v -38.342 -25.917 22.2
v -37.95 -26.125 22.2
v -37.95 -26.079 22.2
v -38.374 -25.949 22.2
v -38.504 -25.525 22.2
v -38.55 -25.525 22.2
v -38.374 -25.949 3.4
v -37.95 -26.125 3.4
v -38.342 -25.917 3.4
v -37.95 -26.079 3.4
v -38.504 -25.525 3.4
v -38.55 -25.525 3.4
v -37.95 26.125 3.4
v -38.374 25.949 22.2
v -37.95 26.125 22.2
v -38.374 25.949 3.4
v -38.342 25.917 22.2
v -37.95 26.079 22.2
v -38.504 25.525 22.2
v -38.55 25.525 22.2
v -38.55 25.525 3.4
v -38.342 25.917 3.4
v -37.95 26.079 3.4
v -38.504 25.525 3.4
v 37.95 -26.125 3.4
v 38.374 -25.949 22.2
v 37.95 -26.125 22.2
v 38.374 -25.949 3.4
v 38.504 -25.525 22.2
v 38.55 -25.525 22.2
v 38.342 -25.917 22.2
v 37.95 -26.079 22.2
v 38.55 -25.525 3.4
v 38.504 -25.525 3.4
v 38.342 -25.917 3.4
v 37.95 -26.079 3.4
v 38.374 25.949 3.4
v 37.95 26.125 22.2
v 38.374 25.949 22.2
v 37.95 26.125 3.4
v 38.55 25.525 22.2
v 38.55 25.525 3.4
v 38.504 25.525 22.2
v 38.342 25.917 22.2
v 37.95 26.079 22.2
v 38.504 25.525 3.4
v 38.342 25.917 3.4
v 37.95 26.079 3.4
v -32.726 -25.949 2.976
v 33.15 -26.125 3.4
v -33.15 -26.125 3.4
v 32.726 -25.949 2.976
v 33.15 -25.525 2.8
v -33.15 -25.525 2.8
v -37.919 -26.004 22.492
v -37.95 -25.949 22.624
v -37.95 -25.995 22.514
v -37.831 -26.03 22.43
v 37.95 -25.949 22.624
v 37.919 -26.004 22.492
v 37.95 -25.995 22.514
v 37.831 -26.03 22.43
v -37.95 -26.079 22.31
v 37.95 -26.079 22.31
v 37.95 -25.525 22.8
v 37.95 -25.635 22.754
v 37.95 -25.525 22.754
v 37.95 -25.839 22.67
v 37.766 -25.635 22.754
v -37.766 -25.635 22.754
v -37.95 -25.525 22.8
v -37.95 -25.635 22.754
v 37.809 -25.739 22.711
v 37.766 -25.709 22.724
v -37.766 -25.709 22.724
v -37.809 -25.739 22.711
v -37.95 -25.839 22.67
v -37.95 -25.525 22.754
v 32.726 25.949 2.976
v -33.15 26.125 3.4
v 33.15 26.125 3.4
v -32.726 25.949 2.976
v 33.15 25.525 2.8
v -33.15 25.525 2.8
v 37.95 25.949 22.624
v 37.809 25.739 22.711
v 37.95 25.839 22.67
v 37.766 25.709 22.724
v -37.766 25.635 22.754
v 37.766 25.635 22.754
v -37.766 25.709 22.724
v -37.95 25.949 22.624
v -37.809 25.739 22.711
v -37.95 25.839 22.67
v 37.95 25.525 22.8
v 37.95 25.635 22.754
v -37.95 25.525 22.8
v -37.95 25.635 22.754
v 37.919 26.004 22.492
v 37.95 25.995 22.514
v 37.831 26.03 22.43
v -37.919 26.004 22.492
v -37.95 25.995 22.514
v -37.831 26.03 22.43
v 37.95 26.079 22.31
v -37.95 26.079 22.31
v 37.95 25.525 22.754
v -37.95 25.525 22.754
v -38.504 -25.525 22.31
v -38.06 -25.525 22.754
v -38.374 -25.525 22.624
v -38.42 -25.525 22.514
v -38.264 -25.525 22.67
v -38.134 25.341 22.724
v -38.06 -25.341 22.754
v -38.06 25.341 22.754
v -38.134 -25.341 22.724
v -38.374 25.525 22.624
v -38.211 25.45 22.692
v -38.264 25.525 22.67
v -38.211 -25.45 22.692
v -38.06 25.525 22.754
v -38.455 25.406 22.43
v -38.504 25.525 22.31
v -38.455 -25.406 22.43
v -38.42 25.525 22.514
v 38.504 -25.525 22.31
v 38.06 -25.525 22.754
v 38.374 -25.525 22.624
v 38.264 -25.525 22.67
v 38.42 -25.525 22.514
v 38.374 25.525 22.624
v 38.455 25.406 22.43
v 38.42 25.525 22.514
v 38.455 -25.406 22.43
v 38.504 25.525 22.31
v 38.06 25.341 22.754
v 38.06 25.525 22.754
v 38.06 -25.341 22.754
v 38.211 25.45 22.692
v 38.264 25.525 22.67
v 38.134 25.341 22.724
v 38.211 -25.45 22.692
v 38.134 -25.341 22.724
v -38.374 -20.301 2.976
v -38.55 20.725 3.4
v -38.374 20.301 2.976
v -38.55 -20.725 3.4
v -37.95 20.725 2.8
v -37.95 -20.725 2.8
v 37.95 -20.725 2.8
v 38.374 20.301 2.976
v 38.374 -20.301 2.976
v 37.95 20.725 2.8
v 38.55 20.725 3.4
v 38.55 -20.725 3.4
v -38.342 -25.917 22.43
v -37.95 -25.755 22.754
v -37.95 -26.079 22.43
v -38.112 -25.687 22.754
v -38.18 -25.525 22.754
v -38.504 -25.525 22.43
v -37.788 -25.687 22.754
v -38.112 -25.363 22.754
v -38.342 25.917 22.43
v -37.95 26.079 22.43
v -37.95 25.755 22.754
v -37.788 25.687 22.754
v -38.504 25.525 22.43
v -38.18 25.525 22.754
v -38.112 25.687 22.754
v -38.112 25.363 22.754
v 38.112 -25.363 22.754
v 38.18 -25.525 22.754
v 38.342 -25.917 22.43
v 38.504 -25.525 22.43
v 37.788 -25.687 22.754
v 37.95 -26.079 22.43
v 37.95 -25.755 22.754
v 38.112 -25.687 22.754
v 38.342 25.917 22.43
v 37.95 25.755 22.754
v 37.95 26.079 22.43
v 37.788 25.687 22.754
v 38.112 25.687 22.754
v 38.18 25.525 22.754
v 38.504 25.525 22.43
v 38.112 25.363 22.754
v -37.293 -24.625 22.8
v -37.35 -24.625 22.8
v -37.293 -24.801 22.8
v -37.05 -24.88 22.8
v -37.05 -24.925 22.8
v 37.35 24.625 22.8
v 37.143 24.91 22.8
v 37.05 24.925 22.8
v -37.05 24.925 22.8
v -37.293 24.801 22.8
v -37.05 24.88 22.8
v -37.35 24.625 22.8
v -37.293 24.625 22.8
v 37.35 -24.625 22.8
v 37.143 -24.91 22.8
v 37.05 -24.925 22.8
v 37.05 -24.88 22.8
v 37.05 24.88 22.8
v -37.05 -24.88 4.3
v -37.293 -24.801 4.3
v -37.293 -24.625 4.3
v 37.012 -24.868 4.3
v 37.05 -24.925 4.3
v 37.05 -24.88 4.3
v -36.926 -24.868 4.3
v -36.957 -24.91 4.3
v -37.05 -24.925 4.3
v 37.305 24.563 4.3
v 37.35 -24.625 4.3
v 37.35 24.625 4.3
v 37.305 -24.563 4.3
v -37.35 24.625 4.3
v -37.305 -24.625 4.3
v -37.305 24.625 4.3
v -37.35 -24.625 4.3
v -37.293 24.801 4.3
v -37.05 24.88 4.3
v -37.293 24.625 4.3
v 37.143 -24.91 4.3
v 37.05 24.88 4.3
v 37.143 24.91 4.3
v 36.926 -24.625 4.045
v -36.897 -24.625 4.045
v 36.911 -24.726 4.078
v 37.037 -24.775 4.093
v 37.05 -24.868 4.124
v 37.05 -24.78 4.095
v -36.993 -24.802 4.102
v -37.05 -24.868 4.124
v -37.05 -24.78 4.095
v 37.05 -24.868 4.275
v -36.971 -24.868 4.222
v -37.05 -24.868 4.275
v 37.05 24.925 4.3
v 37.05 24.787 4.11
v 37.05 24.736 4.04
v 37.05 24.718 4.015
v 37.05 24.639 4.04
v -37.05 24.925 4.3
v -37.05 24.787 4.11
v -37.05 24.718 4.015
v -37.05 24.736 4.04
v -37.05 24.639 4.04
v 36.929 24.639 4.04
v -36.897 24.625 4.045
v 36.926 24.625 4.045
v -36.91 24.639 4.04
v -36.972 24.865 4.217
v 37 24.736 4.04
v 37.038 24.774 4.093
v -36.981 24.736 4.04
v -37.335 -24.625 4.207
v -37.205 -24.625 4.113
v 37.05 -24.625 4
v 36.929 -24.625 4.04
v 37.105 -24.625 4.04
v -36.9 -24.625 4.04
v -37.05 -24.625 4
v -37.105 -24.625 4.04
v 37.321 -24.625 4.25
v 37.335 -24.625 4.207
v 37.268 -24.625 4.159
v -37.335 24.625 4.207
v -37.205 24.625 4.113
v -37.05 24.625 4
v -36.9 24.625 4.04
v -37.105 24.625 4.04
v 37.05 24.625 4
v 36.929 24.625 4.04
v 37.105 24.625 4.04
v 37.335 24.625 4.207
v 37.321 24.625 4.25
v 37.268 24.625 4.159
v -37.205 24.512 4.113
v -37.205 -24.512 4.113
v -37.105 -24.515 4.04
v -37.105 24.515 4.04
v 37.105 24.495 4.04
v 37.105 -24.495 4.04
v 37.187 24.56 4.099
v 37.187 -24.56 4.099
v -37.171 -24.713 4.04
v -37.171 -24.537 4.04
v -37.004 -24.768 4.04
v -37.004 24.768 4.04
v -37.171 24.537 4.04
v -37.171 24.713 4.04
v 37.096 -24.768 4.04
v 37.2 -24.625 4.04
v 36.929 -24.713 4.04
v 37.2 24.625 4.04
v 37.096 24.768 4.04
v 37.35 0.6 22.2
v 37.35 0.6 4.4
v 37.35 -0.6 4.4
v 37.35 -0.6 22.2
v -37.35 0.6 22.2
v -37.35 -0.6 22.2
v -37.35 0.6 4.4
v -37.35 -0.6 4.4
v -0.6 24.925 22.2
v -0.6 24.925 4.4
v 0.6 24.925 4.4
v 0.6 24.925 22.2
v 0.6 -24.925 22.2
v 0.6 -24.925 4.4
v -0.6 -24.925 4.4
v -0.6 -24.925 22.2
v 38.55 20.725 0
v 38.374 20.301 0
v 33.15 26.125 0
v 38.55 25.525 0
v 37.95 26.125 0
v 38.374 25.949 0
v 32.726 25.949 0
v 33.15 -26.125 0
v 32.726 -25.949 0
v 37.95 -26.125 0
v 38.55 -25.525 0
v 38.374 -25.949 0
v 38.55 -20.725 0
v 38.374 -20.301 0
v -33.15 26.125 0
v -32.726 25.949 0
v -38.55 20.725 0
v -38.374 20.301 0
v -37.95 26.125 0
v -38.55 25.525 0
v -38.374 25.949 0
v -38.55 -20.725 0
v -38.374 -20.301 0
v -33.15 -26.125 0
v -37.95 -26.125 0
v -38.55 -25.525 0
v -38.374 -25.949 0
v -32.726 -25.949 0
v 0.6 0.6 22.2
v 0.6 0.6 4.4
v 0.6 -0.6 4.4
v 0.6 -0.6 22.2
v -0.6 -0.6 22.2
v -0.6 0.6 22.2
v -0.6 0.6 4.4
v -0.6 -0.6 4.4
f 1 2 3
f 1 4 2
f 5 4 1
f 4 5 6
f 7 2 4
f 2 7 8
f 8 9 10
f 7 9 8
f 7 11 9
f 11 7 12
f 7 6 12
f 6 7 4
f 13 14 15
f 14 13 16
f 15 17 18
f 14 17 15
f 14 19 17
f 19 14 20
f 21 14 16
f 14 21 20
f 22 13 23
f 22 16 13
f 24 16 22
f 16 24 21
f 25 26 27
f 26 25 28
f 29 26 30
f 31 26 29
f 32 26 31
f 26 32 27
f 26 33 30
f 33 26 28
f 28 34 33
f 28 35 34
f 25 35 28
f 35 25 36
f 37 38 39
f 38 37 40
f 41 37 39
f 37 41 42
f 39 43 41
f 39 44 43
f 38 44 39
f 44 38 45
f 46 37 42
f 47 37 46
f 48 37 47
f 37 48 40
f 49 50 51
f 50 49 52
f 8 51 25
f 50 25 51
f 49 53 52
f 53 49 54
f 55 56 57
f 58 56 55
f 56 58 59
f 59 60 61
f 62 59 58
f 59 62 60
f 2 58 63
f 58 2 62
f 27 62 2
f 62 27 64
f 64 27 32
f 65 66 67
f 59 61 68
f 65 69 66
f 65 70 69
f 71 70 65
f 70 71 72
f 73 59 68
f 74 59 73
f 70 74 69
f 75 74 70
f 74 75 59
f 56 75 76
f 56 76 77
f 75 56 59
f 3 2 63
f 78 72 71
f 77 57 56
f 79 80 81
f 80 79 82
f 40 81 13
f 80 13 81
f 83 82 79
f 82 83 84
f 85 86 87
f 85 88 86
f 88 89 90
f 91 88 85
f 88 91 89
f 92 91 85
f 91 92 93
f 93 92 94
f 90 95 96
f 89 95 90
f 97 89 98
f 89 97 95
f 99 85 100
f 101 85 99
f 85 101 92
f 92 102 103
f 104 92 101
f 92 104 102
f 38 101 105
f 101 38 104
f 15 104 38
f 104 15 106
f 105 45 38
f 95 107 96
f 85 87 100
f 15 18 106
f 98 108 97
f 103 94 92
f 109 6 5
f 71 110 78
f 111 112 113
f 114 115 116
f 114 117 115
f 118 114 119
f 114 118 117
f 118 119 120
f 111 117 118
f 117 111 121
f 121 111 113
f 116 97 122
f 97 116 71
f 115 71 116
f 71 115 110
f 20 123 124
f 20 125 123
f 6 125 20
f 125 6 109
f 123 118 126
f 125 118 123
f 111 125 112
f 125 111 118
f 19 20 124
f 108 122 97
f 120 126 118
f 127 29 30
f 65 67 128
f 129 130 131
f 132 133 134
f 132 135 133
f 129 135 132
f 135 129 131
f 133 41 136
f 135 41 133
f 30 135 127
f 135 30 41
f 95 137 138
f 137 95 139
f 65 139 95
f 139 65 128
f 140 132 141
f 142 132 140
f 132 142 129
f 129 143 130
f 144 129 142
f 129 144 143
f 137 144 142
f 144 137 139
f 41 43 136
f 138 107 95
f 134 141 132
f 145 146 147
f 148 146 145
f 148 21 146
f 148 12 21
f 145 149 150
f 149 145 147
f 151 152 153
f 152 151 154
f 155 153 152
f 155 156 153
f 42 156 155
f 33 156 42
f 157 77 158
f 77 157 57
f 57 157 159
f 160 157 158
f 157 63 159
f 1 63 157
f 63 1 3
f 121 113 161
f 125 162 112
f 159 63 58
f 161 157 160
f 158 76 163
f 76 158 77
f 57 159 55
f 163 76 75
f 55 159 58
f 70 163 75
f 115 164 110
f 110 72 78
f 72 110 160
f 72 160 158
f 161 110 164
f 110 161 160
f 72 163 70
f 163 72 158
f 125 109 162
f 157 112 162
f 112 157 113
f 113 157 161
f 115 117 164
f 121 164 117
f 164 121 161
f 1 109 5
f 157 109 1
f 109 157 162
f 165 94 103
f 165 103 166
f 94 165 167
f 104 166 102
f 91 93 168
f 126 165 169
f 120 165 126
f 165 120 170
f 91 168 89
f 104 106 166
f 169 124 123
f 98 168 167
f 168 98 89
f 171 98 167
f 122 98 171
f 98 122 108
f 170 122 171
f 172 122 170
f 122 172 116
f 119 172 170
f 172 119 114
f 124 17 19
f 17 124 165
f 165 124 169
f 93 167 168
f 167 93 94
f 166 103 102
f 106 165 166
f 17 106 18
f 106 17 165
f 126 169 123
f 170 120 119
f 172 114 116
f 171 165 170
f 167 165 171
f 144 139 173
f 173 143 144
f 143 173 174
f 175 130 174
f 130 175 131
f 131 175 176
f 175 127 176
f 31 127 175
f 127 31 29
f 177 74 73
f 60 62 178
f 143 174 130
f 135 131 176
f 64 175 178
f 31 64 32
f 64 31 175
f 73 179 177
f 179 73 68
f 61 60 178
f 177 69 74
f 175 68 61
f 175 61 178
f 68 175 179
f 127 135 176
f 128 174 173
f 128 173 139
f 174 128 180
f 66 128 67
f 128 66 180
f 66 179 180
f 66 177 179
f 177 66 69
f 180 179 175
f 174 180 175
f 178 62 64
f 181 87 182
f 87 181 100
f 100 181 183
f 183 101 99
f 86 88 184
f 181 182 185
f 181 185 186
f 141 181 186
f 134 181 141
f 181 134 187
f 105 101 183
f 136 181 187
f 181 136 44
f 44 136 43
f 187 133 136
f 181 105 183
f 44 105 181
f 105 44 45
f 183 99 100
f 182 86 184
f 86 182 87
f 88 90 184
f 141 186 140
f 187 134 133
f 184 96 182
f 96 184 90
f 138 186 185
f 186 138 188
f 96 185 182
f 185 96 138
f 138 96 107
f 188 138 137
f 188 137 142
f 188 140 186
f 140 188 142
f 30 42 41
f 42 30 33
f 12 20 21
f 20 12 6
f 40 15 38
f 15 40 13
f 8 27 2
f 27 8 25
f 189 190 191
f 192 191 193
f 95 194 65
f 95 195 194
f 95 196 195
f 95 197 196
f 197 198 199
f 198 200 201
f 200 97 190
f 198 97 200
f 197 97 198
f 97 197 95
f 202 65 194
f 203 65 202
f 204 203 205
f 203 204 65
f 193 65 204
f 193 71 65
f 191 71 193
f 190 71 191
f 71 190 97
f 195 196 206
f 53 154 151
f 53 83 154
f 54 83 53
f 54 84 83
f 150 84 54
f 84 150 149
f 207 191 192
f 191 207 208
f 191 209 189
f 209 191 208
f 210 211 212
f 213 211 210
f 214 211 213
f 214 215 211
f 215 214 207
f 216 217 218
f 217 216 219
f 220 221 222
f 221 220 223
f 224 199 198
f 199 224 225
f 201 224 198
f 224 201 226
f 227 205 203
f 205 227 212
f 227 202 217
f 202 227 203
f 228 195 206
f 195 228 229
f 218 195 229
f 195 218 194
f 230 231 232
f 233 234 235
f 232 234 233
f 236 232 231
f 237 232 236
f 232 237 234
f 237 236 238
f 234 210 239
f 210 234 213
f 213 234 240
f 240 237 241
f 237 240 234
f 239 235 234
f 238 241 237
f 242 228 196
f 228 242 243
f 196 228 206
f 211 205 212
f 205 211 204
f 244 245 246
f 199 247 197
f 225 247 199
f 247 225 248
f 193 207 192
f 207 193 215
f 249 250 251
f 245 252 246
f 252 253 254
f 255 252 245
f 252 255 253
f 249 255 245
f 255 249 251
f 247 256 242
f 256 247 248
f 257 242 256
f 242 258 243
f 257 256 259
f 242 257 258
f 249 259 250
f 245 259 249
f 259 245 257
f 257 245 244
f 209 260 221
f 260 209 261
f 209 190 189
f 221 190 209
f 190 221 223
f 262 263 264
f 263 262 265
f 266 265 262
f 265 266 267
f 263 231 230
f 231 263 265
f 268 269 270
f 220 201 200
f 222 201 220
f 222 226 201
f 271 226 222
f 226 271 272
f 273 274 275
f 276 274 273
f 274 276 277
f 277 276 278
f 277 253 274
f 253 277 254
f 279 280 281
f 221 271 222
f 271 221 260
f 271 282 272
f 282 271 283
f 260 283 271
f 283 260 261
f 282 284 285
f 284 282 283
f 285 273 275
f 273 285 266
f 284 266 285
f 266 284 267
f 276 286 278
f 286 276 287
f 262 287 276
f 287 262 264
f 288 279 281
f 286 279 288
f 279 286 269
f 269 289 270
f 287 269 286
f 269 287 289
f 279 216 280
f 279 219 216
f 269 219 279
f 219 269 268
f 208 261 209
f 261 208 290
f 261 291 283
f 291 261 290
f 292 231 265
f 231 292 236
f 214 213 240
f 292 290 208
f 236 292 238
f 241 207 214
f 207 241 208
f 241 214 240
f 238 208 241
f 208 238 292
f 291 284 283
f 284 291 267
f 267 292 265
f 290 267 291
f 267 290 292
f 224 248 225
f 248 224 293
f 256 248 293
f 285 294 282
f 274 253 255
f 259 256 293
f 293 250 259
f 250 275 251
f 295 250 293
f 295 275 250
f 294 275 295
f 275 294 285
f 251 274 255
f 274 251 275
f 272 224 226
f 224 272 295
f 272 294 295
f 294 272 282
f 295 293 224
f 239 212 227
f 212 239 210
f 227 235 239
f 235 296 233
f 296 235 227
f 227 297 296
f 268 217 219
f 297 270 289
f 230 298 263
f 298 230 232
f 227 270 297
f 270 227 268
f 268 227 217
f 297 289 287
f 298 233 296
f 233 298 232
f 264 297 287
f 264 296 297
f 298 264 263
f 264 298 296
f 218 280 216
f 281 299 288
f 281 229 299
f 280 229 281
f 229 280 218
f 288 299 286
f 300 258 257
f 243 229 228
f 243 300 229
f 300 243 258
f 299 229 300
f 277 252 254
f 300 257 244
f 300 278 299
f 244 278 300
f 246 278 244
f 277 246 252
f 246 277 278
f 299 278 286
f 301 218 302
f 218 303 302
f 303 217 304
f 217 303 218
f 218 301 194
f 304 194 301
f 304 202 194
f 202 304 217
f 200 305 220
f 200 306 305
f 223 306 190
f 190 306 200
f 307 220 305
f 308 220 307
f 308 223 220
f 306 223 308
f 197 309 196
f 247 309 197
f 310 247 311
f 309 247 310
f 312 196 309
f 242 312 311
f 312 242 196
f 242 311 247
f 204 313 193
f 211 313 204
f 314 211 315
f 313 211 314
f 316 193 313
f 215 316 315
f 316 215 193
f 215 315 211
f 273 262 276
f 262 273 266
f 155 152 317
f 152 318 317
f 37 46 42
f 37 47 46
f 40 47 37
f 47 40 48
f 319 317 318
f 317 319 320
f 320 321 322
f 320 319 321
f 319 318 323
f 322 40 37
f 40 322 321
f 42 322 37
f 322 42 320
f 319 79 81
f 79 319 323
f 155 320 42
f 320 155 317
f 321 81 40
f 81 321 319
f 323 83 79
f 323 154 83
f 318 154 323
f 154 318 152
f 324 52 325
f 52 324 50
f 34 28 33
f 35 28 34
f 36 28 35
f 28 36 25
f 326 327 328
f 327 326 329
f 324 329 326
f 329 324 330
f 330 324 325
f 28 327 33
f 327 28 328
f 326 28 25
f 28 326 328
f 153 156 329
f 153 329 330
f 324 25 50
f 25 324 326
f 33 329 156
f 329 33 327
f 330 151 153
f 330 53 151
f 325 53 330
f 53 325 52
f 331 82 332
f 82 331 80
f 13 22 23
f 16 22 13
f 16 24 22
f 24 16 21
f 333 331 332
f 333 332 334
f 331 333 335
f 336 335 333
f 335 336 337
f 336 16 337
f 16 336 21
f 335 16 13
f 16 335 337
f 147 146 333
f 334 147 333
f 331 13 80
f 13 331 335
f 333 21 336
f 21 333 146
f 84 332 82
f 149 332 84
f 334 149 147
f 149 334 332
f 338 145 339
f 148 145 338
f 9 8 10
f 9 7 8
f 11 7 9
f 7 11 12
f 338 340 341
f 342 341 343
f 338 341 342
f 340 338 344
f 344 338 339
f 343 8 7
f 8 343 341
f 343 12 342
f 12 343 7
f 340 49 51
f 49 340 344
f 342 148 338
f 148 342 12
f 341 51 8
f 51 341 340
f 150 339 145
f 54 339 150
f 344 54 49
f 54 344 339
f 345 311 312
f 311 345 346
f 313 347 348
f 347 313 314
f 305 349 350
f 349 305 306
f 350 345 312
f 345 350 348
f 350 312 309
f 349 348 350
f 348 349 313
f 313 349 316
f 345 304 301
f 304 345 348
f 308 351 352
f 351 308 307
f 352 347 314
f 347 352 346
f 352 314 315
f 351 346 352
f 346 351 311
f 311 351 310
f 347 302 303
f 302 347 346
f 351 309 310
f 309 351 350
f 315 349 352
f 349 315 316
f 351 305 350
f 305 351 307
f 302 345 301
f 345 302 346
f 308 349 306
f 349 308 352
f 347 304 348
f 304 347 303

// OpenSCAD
use <MCAD/boxes.scad>

/* [Main] */

// Number of vertical "slots" in the case.
lines = 1; // [1,2,3,4,5]

// Number of horizontal "slots" in the case.
columns = 2; // [1,2,3,4,5,6,7,8,9,10]

vertical_dividers = 1; // [0,1,2,3,4,5,6,7,8,9,10]
horizontal_dividers = 1; // [0,1,2,3,4,5,6,7,8,9,10]

case_height = 20; // [41:Shallow, 46.2:Deep]

/* [Optional] */

skirt_size = 0;  // [0:50]

wall_thickness = 1.2;

// Creates 2 separate pieces that can be printed without support but that have to be glued together.
split_base_and_top = "No"; // [No,Yes]

/* [Hidden] */

$fa=0.5; // default minimum facet angle is now 0.5
$fs=0.5; // default minimum facet size is now 0.5 mm

single_box_width = 37.1;
single_box_height = 52.25;

double_box_width = 77.1;
double_box_height = 107.4;

round_radius = wall_thickness / 2;

feet_height = 2.8;
feet_size = 6;

feet_subtract = 0;//wall_thickness + 0.5;

// Correction due to Simplify3D bug
simplify_correction = 0.5;

spacing_width = (double_box_width - single_box_width * 2);
spacing_height = (double_box_height - single_box_height * 2);

final_width = (single_box_width * columns) + (spacing_width * (columns - 1));
final_height = (single_box_height * lines) + (spacing_height * (lines - 1));

internal_width = final_width - 2 * wall_thickness;
internal_height = final_height - 2 * wall_thickness;

vertical_spacing = (internal_width - (wall_thickness * vertical_dividers)) / (vertical_dividers + 1);
horizontal_spacing = (internal_height - (wall_thickness * horizontal_dividers)) / (horizontal_dividers + 1);

echo("W=", final_width, " H=", final_height, " vs=", vertical_spacing, " hs=", horizontal_spacing);

if (split_base_and_top == "Yes") {
    translate([0, final_height / 2 + 5, - feet_height - round_radius])
    difference() {
        box();
        translate([0, 0, - case_height/2 - 1 + feet_height + round_radius]) cube([final_width + 2, final_height + 2, case_height + 2], center = true);
    }

    translate([0, -final_height / 2 - 5, 0])
    rotate([0, 180, 0])
    translate([0, 0, -feet_height - round_radius])
    difference() {
        box();
        translate([0, 0, feet_height + case_height / 2 + 1 + round_radius]) cube([final_width + 2, final_height + 2, case_height + 2], center = true);
    }
} else {
    box();
}

module feet() {
	translate([0,0,-(feet_height-round_radius)/2])
	difference() {
		union() {
			difference() {
				roundedBox([feet_size, feet_size, feet_height + round_radius], round_radius, sidesonly = true);
				rotate([0,0,45]) translate([-feet_size, 0, -feet_height]) cube([feet_size*2, feet_size, feet_height + 4]);
			}
		
			if (skirt_size > 0) {
				translate([0,0,-(feet_height + round_radius)/2]) cylinder(r = skirt_size, h = 0.3, center = false);
			}
		}
		if (skirt_size > 0) {
			translate([-skirt_size-1,0,-(feet_height + round_radius)/2-0.5]) cube([skirt_size+1, skirt_size+1, 1]);
		}
	}
}
module box() {
    translate([0, 0, case_height / 2 + feet_height])
    union() {
        difference() {
            roundedBox([final_width, final_height, case_height], round_radius);
            translate([0,0,wall_thickness]) roundedBox([final_width - 2 * wall_thickness, final_height - 2 * wall_thickness, case_height], round_radius/2);
        }
        
        if (vertical_dividers > 0) {
            translate([-(internal_width - wall_thickness) / 2,0,0])
            for (i = [1:vertical_dividers]) {
                translate([vertical_spacing*i+wall_thickness * (i-1),0,simplify_correction]) cube([wall_thickness, internal_height, case_height-wall_thickness-simplify_correction*2], center = true);
            }
        }
        
        if (horizontal_dividers > 0) {
            translate([0,-(internal_height - wall_thickness) / 2,0])
            for (i = [1:horizontal_dividers]) {
                translate([0,horizontal_spacing*i+wall_thickness * (i-1),simplify_correction]) cube([internal_width, wall_thickness, case_height-wall_thickness-simplify_correction*2], center = true);
            }
        }
        
        for (x=[1, -1]) {
            for (y=[1, -1]) {
                translate([x * (final_width - feet_size) / 2 - x * feet_subtract, y * (final_height - feet_size) / 2 - y * feet_subtract, -case_height / 2]) rotate([0,0, (x==1 && y ==1 ? 90 : (x == -1 && y == 1 ? 180 : (x == -1 && y == -1 ? 270 : 0)))]) feet();
            }
        }	
    }
}
